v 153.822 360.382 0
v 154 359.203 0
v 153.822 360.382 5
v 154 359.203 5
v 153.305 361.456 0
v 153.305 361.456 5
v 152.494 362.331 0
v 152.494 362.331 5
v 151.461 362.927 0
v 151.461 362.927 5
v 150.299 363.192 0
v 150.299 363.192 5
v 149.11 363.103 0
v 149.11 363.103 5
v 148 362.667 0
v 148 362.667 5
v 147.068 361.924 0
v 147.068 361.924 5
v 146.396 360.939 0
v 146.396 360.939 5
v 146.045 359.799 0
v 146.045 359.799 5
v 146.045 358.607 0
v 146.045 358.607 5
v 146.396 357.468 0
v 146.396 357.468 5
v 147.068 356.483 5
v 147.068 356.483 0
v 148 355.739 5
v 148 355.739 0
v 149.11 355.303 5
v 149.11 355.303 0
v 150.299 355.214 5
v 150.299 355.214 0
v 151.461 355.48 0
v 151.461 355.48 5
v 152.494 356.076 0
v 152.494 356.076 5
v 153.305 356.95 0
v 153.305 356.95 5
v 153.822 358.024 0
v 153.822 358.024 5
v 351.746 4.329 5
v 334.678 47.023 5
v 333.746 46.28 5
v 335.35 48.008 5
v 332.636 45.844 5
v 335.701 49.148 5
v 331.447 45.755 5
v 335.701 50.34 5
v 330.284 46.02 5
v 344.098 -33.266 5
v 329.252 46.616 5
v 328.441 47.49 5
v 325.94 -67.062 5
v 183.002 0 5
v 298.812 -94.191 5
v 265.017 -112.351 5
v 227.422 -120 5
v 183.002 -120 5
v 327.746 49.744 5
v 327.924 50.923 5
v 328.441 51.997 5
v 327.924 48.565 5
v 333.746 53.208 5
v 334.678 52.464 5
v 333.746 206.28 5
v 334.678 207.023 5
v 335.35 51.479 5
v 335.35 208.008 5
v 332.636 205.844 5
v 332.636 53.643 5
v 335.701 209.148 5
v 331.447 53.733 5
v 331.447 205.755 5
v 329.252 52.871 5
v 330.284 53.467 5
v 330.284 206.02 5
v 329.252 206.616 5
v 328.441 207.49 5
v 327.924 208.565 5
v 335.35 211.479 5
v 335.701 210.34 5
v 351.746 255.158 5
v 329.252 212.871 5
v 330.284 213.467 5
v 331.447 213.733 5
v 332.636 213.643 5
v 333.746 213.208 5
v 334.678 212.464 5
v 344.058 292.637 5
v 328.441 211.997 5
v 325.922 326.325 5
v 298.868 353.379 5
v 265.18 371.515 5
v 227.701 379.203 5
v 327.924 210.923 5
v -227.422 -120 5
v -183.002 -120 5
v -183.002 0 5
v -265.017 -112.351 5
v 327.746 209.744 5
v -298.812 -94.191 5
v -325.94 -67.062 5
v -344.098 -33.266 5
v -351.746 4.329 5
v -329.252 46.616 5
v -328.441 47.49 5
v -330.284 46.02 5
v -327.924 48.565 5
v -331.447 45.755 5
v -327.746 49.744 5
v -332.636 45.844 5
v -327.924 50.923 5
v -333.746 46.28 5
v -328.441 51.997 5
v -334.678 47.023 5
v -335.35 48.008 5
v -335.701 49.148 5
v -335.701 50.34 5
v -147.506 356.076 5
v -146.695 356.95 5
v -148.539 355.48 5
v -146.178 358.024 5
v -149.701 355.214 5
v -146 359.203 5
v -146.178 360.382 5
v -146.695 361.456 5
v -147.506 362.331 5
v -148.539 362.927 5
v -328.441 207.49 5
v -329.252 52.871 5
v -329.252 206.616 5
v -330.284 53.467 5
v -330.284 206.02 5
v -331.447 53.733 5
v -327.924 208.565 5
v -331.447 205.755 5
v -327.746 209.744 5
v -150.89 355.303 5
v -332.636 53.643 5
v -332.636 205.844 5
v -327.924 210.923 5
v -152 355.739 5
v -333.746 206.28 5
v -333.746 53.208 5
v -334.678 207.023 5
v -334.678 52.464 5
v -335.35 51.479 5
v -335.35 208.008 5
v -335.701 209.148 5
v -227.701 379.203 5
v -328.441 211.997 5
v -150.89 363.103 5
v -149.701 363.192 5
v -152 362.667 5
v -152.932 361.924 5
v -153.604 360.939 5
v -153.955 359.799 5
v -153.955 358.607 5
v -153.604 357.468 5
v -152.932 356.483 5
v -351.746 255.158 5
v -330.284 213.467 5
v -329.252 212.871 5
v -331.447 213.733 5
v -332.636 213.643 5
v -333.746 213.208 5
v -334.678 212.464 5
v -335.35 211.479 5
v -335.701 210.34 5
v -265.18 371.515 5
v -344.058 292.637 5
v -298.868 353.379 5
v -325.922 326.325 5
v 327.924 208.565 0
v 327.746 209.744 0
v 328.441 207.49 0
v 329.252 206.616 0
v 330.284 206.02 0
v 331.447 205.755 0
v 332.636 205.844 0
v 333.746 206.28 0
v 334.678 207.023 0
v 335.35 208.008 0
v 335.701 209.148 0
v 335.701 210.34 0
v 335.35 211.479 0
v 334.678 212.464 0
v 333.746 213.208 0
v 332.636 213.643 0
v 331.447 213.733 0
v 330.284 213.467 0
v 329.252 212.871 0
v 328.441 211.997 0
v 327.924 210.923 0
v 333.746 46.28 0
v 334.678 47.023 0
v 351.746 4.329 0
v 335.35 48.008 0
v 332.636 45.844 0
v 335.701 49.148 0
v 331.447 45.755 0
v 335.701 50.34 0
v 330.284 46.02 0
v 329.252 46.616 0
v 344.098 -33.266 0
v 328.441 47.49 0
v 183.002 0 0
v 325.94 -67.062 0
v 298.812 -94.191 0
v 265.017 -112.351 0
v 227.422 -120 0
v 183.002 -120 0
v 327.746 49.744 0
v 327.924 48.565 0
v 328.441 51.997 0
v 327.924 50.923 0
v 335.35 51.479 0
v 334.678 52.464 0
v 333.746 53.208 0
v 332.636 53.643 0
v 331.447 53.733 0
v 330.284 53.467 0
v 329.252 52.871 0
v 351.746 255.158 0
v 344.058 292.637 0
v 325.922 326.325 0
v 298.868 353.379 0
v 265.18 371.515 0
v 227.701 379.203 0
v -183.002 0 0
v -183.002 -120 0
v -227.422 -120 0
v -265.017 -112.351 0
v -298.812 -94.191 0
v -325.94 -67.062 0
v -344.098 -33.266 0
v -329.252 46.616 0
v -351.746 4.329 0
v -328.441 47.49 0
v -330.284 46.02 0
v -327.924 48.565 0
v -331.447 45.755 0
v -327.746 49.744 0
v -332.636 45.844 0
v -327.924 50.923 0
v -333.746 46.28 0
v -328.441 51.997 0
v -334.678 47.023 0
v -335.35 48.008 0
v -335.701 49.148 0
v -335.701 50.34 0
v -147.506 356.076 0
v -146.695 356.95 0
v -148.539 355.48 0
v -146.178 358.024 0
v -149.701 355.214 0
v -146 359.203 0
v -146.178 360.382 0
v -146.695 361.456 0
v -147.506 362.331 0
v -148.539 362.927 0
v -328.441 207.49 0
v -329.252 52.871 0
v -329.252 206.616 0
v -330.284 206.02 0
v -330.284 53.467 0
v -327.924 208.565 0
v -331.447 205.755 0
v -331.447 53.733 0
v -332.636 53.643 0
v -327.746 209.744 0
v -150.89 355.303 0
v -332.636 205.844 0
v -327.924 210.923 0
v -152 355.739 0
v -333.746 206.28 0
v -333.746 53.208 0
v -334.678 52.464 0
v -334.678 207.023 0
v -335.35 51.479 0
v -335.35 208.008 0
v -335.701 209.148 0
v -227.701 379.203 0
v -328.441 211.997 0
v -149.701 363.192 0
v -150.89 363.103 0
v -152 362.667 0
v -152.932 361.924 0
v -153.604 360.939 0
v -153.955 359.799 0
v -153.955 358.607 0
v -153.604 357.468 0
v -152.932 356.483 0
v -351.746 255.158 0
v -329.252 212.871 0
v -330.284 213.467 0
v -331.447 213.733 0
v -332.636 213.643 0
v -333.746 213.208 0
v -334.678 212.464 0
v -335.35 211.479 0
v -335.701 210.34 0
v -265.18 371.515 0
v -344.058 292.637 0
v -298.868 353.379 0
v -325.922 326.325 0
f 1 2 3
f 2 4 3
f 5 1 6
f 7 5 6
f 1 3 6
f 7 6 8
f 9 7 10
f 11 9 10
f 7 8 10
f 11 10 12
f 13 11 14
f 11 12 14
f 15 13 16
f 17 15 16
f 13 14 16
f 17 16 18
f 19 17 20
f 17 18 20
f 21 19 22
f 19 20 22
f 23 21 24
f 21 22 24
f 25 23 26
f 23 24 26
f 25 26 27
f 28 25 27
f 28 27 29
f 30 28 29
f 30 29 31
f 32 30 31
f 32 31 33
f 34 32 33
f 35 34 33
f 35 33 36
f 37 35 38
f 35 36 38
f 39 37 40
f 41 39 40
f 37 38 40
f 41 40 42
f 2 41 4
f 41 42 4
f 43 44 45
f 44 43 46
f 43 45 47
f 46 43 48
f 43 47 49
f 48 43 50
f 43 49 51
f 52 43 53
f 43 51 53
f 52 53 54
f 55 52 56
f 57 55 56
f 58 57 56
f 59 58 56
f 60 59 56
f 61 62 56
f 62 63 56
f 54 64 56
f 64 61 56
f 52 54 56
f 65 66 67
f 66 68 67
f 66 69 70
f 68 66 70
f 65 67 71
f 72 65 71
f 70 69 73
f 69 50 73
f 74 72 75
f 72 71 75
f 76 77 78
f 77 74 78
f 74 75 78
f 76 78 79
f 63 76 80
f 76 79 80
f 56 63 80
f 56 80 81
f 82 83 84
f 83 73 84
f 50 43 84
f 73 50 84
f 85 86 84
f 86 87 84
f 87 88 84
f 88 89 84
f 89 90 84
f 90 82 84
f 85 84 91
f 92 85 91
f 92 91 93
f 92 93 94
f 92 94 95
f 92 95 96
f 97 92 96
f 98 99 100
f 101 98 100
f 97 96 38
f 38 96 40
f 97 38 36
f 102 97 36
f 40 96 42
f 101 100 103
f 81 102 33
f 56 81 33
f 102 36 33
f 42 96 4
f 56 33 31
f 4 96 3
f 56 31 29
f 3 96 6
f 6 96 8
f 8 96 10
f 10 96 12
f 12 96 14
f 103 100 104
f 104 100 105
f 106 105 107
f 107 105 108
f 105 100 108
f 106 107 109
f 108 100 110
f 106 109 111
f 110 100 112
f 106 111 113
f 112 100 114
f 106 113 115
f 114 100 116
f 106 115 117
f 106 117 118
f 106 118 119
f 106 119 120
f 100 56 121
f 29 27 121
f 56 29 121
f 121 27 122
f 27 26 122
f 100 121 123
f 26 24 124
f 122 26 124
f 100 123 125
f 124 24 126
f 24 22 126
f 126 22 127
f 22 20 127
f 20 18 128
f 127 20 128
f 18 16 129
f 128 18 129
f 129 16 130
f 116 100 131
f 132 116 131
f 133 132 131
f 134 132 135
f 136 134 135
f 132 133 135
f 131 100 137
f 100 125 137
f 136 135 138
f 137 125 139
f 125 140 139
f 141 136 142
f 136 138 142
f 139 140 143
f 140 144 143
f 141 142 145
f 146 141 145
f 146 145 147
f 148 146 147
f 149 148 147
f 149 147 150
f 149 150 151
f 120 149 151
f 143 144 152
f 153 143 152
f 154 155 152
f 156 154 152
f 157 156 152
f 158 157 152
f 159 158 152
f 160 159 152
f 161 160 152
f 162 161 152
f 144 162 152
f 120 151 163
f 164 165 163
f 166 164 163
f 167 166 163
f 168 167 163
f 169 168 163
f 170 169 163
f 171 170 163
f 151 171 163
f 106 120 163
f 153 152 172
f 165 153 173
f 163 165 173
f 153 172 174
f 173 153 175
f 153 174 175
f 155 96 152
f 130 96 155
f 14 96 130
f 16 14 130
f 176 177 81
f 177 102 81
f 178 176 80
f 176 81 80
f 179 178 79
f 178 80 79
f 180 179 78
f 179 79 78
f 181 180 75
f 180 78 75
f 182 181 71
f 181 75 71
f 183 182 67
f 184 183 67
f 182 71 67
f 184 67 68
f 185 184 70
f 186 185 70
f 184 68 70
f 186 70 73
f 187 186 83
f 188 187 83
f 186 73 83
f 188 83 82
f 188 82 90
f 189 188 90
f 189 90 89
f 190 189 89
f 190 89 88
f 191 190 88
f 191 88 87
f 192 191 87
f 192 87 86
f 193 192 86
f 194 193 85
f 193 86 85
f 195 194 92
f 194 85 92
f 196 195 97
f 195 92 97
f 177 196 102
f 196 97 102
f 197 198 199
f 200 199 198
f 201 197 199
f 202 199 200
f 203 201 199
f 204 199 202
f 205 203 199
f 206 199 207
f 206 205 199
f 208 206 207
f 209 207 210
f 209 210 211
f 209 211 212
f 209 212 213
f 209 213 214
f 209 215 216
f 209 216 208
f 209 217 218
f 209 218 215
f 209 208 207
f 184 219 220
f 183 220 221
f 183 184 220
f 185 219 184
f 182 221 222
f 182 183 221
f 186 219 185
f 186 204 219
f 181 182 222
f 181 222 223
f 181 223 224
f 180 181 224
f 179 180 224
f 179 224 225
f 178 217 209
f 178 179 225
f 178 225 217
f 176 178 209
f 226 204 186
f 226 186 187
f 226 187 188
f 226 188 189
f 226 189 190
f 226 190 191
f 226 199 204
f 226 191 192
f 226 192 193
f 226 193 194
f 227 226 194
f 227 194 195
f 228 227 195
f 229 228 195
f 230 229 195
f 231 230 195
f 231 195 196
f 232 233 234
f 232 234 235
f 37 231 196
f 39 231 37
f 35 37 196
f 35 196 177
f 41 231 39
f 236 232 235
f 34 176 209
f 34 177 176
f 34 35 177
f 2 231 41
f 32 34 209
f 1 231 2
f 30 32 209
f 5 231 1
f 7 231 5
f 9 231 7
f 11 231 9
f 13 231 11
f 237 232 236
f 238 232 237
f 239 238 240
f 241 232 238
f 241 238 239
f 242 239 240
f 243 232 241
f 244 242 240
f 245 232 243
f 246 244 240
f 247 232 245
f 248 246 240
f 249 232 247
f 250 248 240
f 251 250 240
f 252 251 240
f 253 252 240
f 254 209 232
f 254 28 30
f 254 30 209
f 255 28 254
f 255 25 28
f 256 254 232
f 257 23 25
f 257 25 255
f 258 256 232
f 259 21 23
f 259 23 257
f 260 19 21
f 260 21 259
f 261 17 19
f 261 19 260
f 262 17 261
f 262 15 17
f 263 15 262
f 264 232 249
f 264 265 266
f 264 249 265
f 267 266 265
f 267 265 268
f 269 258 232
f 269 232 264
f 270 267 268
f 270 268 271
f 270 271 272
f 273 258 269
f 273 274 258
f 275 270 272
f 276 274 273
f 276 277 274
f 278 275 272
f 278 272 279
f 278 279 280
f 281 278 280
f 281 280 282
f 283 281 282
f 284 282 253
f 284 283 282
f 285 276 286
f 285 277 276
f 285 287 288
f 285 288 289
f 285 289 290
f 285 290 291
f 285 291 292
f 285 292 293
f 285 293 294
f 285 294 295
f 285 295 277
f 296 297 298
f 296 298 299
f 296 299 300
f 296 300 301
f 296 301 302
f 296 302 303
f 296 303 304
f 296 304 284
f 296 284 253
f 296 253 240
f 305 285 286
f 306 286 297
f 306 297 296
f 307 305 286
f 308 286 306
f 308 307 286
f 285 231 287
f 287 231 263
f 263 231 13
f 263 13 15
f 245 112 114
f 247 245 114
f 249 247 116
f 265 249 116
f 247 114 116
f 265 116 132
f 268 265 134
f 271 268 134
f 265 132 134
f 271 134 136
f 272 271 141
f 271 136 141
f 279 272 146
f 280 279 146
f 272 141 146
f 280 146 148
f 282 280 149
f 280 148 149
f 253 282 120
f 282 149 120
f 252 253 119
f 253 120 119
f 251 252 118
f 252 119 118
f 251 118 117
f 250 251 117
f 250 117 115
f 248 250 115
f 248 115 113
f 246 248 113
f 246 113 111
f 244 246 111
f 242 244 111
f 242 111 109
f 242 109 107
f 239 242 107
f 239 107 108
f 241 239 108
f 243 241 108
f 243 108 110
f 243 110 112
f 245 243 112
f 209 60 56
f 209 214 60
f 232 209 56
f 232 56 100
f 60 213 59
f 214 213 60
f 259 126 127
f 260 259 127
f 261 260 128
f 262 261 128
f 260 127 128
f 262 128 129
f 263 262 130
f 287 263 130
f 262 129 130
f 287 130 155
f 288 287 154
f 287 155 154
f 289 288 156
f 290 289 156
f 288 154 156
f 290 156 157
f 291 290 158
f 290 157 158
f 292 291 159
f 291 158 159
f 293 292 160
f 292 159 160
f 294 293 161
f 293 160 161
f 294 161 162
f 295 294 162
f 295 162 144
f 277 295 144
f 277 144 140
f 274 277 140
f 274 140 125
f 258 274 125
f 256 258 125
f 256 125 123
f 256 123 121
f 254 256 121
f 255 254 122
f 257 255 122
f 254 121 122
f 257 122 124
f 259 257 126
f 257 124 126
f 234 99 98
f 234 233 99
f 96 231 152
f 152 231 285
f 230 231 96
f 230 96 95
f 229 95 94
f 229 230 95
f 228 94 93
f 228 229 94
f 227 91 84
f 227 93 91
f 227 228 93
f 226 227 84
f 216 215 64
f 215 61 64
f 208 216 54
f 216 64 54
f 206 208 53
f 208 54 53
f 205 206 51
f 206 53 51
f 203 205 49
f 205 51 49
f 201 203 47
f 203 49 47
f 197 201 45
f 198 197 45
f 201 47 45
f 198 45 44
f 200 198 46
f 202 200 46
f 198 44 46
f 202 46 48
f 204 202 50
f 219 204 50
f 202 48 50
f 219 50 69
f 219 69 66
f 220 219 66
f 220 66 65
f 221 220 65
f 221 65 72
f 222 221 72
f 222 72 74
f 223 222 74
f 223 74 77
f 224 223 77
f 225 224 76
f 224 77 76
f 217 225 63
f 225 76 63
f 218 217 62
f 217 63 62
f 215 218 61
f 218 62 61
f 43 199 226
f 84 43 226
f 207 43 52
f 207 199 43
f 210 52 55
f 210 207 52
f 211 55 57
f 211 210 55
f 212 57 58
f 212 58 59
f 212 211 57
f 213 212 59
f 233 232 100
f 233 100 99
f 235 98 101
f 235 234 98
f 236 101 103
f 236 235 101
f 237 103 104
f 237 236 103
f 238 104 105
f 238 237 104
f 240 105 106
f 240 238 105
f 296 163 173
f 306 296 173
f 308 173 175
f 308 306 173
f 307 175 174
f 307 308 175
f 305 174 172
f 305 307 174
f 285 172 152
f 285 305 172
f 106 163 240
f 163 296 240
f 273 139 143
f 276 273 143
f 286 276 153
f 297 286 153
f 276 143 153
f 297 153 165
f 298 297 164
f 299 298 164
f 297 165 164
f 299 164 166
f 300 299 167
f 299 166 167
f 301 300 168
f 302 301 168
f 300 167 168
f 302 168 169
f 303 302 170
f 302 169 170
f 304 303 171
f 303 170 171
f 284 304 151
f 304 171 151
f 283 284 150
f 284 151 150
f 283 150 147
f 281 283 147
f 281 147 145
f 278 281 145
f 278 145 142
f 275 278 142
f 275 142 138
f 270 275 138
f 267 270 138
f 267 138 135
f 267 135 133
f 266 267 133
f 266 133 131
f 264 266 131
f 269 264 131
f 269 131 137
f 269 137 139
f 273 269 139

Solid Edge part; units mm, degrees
sketch "Sketch1" plane through (0, 0, 0) normal (0, 0, 1) x (1, 0, 0)
  line L0 (-183.0017, -120) -> (-227.4217, -120)
  line L1 (-289.5811, -57.8353) -> (-227.4217, -120)
  line L2 (-289.5811, -57.8353) -> (-351.7458, 4.3295)
  line L3 (-351.7458, 129.7437) -> (-351.7458, 4.3295)
  line L4 (-351.7458, 129.7437) -> (-351.7458, 255.1579)
  line L5 (-289.4346, 317.4691) -> (-351.7458, 255.1579)
  line L6 (-289.4346, 317.4691) -> (-227.7006, 379.2031)
  line L7 (0, 379.2031) -> (-227.7006, 379.2031)
  line L8 (0, 379.2031) -> (0, 0)
  line L9 (0, 0) -> (-183.0017, 0)
  line L10 (-183.0017, 0) -> (-183.0017, -120)
  dimension "D1" = 351.7458
  dimension "D2" = 227.7006
  dimension "D3" = 120
  dimension "D4" = 44.42
  dimension "D5" = 87.3051
  dimension "D6" = 88.1213
  dimension "D7" = 125.4142
  dimension "D8" = 125.4142
  dimension "D9" = 87.9142
  dimension "D10" = 87.9104
  dimension "D11" = 499.2031
extrude "Protrusion1" add sketch "Sketch1" along normal blind 5
mirror "Mirror1" about plane through (0, 0, 0) normal (1, 0, 0) of "Protrusion1"
sketch "Sketch2" plane through (0, 149.6016, 5) normal (0, 0, 1) x (1, 0, 0)
  circle A0 centre (150, 209.6016) radius 4
  circle A1 centre (-150, 209.6016) radius 4
  dimension "D1" = 20
  dimension "D2" = 8
  dimension "D3" = 300
extrude "Cutout1" cut sketch "Sketch2" against normal through all
sketch "Sketch3" plane through (0, 149.6016, 5) normal (0, 0, 1) x (1, 0, 0)
  circle A0 centre (-331.7458, 60.1421) radius 4
  circle A1 centre (-331.7458, -99.8579) radius 4
  dimension "D1" = 160
  dimension "D2" = 20
  dimension "D3" = 8
extrude "Cutout2" cut sketch "Sketch3" against normal through all
mirror "Mirror2" about plane through (0, 0, 0) normal (1, 0, 0) of "Cutout2"
sketch "Sketch4" plane through (0, 149.6016, 0) normal (0, 0, -1) x (-1, 0, 0)
  line L0 (-351.7458, -111.1142) -> (-193.1203, -269.6016)
  line L1 (-193.1203, -269.6016) -> (-227.4217, -269.6016)
  arc A0 (-351.7458, -145.2721) -> (-227.4217, -269.6016) centre (-220.2414, -138.0974) ccw
  line L2 (-351.7458, -111.1142) -> (-351.7458, -145.2721)
  dimension "D1" = 131.7
extrude "Protrusion2" add sketch "Sketch4" against normal up to vertex (5 mm away)
sketch "Sketch5" plane through (0, 149.6016, 0) normal (0, 0, -1) x (-1, 0, 0)
  line L0 (-227.7006, 229.6016) -> (-351.7458, 105.5563)
  arc A0 (-351.7458, 105.5563) -> (-227.7006, 229.6016) centre (-220.2564, 98.1121) cw
extrude "Protrusion3" add sketch "Sketch5" against normal up to vertex (5 mm away)
mirror "Mirror3" about plane through (0, 0, 0) normal (1, 0, 0) of "Protrusion3", "Protrusion2"
properties material "ABS-Plastik, mittelfest"
